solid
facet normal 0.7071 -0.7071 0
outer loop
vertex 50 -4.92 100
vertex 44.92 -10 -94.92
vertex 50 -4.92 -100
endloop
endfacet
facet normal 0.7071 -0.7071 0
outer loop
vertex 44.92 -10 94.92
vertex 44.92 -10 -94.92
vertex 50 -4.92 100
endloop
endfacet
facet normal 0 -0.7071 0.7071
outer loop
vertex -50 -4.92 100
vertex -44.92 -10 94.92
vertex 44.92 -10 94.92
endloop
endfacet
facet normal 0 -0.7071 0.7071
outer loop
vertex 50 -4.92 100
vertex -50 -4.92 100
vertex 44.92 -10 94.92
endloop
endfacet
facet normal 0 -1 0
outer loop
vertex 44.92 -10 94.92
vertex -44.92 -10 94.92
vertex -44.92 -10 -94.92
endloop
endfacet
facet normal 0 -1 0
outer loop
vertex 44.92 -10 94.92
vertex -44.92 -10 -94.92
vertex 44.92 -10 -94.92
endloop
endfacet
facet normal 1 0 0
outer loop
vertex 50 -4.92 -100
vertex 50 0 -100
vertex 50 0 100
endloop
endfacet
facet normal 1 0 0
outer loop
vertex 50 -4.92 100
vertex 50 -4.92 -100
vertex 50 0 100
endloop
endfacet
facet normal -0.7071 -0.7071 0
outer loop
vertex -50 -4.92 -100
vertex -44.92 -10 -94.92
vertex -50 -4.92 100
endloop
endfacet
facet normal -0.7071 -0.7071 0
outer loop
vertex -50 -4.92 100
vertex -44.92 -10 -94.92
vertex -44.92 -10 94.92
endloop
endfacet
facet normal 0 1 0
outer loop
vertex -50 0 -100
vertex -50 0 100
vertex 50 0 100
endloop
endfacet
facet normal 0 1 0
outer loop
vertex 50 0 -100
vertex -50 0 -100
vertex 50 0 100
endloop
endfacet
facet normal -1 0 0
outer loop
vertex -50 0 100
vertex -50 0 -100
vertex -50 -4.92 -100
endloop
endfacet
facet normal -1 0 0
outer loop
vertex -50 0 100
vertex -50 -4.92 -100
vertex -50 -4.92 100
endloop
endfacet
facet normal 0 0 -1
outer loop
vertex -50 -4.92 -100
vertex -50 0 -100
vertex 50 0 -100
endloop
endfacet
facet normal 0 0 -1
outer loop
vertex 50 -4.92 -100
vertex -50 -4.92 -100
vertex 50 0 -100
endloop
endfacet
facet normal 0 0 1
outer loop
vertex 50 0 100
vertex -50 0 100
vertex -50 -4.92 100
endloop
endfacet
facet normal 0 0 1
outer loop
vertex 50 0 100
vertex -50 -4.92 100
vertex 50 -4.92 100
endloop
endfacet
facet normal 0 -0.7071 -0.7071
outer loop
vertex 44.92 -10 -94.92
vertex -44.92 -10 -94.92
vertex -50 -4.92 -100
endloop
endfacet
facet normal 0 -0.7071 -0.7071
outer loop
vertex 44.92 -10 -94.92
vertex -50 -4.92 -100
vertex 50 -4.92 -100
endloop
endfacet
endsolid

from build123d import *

# Parameters (mm, degrees)
F0_W     = 100
F0_H     = 200
F1_DEPTH = 10
F2_SIZE  = 5.08


# Not quite as in the source:
# - the program builds the solid bodies; features that only make, move or delete a surface that nothing else refers to are left out


with BuildPart() as f1:
    # F0 (on Front) → F1 (new body)
    with BuildSketch(Plane.XZ):
        Rectangle(F0_W, F0_H)
    extrude(amount=F1_DEPTH)

    # F2
    f2_edges = [f1.edges().sort_by_distance(p)[0] for p in [
        (-50, -10, 0),
        (0, -10, 100),
        (0, -10, -100),
        (50, -10, 0),
    ]]
    chamfer(f2_edges, length=F2_SIZE)


solid = f1.part
